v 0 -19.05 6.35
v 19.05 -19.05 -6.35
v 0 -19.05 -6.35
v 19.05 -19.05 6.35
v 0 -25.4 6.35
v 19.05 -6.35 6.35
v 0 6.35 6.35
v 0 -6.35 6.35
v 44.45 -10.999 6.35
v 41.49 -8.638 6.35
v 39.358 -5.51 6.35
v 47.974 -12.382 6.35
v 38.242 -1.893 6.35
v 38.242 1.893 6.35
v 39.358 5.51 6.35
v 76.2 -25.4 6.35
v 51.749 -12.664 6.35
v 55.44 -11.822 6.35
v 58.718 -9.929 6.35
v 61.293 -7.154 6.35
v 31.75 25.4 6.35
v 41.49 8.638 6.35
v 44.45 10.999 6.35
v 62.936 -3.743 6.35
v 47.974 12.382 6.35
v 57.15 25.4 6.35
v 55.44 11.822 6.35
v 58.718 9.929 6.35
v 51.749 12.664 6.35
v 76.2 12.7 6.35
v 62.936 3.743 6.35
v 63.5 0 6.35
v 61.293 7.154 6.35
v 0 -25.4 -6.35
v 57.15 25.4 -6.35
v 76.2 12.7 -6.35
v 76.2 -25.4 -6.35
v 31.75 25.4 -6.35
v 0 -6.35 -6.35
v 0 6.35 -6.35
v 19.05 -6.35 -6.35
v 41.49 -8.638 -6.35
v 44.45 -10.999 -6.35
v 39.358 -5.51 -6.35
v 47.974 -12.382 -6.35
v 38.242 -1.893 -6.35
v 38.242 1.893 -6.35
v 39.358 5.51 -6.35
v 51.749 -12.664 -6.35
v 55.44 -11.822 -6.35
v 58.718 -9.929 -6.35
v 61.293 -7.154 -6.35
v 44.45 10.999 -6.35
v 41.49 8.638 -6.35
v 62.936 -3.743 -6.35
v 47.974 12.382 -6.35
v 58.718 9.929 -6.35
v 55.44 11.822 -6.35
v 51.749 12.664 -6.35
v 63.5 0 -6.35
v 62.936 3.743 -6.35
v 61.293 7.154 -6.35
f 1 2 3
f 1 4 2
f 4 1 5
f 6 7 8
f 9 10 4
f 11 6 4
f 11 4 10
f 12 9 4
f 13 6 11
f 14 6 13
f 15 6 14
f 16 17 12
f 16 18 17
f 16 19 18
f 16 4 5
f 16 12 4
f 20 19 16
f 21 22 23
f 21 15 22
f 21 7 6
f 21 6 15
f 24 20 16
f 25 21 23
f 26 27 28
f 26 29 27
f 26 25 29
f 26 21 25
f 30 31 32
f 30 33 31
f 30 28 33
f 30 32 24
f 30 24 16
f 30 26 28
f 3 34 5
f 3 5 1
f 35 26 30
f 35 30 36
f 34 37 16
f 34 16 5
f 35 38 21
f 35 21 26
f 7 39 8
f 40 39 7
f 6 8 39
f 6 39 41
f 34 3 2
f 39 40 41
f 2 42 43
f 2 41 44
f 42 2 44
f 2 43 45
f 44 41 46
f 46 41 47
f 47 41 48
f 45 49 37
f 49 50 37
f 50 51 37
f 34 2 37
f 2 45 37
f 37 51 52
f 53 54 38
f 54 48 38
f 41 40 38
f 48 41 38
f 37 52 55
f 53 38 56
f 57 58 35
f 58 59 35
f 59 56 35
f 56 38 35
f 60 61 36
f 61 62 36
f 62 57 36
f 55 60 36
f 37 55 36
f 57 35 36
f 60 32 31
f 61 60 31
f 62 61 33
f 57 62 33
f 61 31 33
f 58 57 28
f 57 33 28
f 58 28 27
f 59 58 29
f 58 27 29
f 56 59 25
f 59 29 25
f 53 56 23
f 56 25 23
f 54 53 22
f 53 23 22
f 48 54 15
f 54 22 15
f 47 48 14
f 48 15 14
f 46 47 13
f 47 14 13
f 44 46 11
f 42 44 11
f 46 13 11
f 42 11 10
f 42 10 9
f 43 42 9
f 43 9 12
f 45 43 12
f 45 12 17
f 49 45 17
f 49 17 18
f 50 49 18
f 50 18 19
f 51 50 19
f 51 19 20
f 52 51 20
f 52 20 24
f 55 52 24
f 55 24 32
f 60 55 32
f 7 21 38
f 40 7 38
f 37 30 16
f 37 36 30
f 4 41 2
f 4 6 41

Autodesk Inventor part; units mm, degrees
sketch "Sketch1" plane through (0, 0, 0) normal (0, 0, 1) x (1, 0, 0)
  line L0 (0, 25.4) -> (76.2, 25.4)
  line L1 (76.2, 25.4) -> (76.2, -25.4)
  line L2 (76.2, -25.4) -> (0, -25.4)
  line L3 (0, -25.4) -> (0, 25.4)
  line L4 (-15.24, 0) -> (91.44, 0) projected
  line L5 (0, 35.56) -> (0, -35.56) projected
  point P0 (0, 0)
  dimension "d0" = 50.8
  dimension "d1" = 76.2
  dimension "d2" = 25.4
  dimension "d3" = 0
extrude "Extrusion1" add sketch "Sketch1" along normal mid plane 12.7
sketch "Sketch2" plane through (0, 0, 6.35) normal (0, 0, 1) x (1, 0, 0)
  circle A0 centre (50.8, 0) radius 12.7
  line L0 (76.2, -25.4) -> (76.2, 25.4) projected
  line L1 (0, -25.4) -> (76.2, -25.4) projected
  point P0 (0, 0)
  dimension "d6" = 25.4
  dimension "d7" = 25.4
  dimension "d8" = 25.4
extrude "Extrusion2" cut sketch "Sketch2" against normal up to surface (12.7 mm away)
sketch "Sketch3" plane through (0, 0, 6.35) normal (0, 0, 1) x (1, 0, 0)
  line L0 (0, -25.4) -> (0, 25.4) projected
  line L1 (0, -6.35) -> (19.05, -6.35)
  line L2 (19.05, -6.35) -> (19.05, -19.05)
  line L3 (19.05, -19.05) -> (0, -19.05)
  line L4 (0, -25.4) -> (76.2, -25.4) projected
  point P0 (0, 0)
  dimension "d11" = 12.7
  dimension "d12" = 19.05
  dimension "d13" = 6.35
extrude "Extrusion3" cut sketch "Sketch3" against normal up to surface (12.7 mm away)
chamfer "Chamfer1" distance 12.7 distance2 19.05 1 edges at (76.2, 25.4, 0) measured on face at (76.2, 8.4667, 2.1167)
chamfer "Chamfer2" distance 31.75 distance2 19.05 1 edges at (0, 25.4, 0) measured on face at (19.05, 25.4, 2.1167)
equation "\"d2\" = 0.5 * d0"
properties part number "chap2ex1"
